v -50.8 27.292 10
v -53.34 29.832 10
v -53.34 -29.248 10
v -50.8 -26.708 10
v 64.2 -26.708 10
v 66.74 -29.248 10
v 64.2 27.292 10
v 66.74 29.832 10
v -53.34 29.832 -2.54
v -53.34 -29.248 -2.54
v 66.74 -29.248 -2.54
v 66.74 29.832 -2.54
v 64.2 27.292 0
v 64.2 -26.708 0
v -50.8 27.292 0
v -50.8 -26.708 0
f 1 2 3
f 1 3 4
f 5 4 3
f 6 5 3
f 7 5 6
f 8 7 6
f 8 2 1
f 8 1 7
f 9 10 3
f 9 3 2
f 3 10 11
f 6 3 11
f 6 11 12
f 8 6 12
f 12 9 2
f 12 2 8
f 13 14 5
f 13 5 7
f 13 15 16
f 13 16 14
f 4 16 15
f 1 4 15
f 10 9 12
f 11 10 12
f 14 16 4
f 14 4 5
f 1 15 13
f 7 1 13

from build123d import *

# Parameters (mm, degrees)
F0_W     = 115.000024
F0_H     = 53.999892
F1_DEPTH = 10
F2_T     = 2.54


with BuildPart() as f1:
    # F0 (on Top) → F1 (new body)
    with BuildSketch(Plane.XY):
        with Locations((6.700012, 0.2917969662)):
            Rectangle(F0_W, F0_H)
    extrude(amount=F1_DEPTH)

    # F2
    f2_openings = [f1.faces().sort_by_distance(p)[0] for p in [
        (6.700012, 0.291797, 10),
    ]]
    offset(amount=F2_T, openings=f2_openings, kind=Kind.INTERSECTION)


solid = f1.part
